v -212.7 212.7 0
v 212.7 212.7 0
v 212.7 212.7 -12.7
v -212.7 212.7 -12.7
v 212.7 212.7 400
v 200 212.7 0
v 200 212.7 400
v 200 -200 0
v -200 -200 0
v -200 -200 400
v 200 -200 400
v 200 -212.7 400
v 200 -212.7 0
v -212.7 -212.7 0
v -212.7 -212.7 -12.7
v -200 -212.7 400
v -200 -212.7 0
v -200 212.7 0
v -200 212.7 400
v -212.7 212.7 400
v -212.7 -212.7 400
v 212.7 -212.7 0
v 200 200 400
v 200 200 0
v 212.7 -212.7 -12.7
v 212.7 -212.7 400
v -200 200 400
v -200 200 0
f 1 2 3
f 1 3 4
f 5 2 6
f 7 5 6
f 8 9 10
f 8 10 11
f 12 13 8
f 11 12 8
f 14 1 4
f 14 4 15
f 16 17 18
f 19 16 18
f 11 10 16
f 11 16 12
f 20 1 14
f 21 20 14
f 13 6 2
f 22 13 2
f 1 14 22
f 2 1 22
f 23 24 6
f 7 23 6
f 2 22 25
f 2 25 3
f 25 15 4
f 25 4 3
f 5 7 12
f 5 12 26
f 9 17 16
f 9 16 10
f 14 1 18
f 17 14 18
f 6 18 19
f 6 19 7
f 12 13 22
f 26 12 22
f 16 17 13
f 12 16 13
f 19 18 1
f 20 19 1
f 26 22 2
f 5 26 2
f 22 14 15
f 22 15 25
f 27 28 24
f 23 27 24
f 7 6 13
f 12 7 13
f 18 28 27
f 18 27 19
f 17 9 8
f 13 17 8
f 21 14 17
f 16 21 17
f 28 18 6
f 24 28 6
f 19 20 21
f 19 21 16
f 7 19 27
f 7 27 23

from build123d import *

# Parameters (mm, degrees)
F0_W     = 400
F0_H     = 400
F0_H_2   = 12.7
F1_DEPTH = 12.7
F2_DEPTH = 400
F3_DEPTH = 400
F4_DEPTH = 400
F5_DEPTH = 400


# Not quite as in the source:
# - a length typed as a fraction of an inch, garbled in the dataset ("3 / 203.2 mm" for 3/8 in), is restored


with BuildPart() as f1:
    # F0 (on Top) → F1 (new body)
    with BuildSketch(Plane.XY):
        Rectangle(F0_W, F0_H)
        with Locations((0, -206.35)):
            Rectangle(F0_W, F0_H_2)
        Polygon((200, 212.7), (200, 200), (200, -200), (200, -212.7), (212.7, -212.7), (212.7, 212.7), align=None)
        with Locations((0, 206.35)):
            Rectangle(F0_W, F0_H_2)
        Polygon((-200, -200), (-200, 200), (-200, 212.7), (-212.7, 212.7), (-212.7, -212.7), (-200, -212.7), align=None)
    extrude(amount=-F1_DEPTH)


with BuildPart() as f2:
    # F0 (on Top) → F2 (new body)
    with BuildSketch(Plane.XY):
        Polygon((-200, -200), (-200, 200), (-200, 212.7), (-212.7, 212.7), (-212.7, -212.7), (-200, -212.7), align=None)
    extrude(amount=F2_DEPTH)


with BuildPart() as f3:
    # F0 (on Top) → F3 (new body)
    with BuildSketch(Plane.XY):
        with Locations((0, 206.35)):
            Rectangle(F0_W, F0_H_2)
    extrude(amount=F3_DEPTH)


with BuildPart() as f4:
    # F0 (on Top) → F4 (new body)
    with BuildSketch(Plane.XY):
        Polygon((200, 212.7), (200, 200), (200, -200), (200, -212.7), (212.7, -212.7), (212.7, 212.7), align=None)
    extrude(amount=F4_DEPTH)


with BuildPart() as f5:
    # F0 (on Top) → F5 (new body)
    with BuildSketch(Plane.XY):
        with Locations((0, -206.35)):
            Rectangle(F0_W, F0_H_2)
    extrude(amount=F5_DEPTH)


solid = Compound([f1.part, f2.part, f3.part, f4.part, f5.part])
